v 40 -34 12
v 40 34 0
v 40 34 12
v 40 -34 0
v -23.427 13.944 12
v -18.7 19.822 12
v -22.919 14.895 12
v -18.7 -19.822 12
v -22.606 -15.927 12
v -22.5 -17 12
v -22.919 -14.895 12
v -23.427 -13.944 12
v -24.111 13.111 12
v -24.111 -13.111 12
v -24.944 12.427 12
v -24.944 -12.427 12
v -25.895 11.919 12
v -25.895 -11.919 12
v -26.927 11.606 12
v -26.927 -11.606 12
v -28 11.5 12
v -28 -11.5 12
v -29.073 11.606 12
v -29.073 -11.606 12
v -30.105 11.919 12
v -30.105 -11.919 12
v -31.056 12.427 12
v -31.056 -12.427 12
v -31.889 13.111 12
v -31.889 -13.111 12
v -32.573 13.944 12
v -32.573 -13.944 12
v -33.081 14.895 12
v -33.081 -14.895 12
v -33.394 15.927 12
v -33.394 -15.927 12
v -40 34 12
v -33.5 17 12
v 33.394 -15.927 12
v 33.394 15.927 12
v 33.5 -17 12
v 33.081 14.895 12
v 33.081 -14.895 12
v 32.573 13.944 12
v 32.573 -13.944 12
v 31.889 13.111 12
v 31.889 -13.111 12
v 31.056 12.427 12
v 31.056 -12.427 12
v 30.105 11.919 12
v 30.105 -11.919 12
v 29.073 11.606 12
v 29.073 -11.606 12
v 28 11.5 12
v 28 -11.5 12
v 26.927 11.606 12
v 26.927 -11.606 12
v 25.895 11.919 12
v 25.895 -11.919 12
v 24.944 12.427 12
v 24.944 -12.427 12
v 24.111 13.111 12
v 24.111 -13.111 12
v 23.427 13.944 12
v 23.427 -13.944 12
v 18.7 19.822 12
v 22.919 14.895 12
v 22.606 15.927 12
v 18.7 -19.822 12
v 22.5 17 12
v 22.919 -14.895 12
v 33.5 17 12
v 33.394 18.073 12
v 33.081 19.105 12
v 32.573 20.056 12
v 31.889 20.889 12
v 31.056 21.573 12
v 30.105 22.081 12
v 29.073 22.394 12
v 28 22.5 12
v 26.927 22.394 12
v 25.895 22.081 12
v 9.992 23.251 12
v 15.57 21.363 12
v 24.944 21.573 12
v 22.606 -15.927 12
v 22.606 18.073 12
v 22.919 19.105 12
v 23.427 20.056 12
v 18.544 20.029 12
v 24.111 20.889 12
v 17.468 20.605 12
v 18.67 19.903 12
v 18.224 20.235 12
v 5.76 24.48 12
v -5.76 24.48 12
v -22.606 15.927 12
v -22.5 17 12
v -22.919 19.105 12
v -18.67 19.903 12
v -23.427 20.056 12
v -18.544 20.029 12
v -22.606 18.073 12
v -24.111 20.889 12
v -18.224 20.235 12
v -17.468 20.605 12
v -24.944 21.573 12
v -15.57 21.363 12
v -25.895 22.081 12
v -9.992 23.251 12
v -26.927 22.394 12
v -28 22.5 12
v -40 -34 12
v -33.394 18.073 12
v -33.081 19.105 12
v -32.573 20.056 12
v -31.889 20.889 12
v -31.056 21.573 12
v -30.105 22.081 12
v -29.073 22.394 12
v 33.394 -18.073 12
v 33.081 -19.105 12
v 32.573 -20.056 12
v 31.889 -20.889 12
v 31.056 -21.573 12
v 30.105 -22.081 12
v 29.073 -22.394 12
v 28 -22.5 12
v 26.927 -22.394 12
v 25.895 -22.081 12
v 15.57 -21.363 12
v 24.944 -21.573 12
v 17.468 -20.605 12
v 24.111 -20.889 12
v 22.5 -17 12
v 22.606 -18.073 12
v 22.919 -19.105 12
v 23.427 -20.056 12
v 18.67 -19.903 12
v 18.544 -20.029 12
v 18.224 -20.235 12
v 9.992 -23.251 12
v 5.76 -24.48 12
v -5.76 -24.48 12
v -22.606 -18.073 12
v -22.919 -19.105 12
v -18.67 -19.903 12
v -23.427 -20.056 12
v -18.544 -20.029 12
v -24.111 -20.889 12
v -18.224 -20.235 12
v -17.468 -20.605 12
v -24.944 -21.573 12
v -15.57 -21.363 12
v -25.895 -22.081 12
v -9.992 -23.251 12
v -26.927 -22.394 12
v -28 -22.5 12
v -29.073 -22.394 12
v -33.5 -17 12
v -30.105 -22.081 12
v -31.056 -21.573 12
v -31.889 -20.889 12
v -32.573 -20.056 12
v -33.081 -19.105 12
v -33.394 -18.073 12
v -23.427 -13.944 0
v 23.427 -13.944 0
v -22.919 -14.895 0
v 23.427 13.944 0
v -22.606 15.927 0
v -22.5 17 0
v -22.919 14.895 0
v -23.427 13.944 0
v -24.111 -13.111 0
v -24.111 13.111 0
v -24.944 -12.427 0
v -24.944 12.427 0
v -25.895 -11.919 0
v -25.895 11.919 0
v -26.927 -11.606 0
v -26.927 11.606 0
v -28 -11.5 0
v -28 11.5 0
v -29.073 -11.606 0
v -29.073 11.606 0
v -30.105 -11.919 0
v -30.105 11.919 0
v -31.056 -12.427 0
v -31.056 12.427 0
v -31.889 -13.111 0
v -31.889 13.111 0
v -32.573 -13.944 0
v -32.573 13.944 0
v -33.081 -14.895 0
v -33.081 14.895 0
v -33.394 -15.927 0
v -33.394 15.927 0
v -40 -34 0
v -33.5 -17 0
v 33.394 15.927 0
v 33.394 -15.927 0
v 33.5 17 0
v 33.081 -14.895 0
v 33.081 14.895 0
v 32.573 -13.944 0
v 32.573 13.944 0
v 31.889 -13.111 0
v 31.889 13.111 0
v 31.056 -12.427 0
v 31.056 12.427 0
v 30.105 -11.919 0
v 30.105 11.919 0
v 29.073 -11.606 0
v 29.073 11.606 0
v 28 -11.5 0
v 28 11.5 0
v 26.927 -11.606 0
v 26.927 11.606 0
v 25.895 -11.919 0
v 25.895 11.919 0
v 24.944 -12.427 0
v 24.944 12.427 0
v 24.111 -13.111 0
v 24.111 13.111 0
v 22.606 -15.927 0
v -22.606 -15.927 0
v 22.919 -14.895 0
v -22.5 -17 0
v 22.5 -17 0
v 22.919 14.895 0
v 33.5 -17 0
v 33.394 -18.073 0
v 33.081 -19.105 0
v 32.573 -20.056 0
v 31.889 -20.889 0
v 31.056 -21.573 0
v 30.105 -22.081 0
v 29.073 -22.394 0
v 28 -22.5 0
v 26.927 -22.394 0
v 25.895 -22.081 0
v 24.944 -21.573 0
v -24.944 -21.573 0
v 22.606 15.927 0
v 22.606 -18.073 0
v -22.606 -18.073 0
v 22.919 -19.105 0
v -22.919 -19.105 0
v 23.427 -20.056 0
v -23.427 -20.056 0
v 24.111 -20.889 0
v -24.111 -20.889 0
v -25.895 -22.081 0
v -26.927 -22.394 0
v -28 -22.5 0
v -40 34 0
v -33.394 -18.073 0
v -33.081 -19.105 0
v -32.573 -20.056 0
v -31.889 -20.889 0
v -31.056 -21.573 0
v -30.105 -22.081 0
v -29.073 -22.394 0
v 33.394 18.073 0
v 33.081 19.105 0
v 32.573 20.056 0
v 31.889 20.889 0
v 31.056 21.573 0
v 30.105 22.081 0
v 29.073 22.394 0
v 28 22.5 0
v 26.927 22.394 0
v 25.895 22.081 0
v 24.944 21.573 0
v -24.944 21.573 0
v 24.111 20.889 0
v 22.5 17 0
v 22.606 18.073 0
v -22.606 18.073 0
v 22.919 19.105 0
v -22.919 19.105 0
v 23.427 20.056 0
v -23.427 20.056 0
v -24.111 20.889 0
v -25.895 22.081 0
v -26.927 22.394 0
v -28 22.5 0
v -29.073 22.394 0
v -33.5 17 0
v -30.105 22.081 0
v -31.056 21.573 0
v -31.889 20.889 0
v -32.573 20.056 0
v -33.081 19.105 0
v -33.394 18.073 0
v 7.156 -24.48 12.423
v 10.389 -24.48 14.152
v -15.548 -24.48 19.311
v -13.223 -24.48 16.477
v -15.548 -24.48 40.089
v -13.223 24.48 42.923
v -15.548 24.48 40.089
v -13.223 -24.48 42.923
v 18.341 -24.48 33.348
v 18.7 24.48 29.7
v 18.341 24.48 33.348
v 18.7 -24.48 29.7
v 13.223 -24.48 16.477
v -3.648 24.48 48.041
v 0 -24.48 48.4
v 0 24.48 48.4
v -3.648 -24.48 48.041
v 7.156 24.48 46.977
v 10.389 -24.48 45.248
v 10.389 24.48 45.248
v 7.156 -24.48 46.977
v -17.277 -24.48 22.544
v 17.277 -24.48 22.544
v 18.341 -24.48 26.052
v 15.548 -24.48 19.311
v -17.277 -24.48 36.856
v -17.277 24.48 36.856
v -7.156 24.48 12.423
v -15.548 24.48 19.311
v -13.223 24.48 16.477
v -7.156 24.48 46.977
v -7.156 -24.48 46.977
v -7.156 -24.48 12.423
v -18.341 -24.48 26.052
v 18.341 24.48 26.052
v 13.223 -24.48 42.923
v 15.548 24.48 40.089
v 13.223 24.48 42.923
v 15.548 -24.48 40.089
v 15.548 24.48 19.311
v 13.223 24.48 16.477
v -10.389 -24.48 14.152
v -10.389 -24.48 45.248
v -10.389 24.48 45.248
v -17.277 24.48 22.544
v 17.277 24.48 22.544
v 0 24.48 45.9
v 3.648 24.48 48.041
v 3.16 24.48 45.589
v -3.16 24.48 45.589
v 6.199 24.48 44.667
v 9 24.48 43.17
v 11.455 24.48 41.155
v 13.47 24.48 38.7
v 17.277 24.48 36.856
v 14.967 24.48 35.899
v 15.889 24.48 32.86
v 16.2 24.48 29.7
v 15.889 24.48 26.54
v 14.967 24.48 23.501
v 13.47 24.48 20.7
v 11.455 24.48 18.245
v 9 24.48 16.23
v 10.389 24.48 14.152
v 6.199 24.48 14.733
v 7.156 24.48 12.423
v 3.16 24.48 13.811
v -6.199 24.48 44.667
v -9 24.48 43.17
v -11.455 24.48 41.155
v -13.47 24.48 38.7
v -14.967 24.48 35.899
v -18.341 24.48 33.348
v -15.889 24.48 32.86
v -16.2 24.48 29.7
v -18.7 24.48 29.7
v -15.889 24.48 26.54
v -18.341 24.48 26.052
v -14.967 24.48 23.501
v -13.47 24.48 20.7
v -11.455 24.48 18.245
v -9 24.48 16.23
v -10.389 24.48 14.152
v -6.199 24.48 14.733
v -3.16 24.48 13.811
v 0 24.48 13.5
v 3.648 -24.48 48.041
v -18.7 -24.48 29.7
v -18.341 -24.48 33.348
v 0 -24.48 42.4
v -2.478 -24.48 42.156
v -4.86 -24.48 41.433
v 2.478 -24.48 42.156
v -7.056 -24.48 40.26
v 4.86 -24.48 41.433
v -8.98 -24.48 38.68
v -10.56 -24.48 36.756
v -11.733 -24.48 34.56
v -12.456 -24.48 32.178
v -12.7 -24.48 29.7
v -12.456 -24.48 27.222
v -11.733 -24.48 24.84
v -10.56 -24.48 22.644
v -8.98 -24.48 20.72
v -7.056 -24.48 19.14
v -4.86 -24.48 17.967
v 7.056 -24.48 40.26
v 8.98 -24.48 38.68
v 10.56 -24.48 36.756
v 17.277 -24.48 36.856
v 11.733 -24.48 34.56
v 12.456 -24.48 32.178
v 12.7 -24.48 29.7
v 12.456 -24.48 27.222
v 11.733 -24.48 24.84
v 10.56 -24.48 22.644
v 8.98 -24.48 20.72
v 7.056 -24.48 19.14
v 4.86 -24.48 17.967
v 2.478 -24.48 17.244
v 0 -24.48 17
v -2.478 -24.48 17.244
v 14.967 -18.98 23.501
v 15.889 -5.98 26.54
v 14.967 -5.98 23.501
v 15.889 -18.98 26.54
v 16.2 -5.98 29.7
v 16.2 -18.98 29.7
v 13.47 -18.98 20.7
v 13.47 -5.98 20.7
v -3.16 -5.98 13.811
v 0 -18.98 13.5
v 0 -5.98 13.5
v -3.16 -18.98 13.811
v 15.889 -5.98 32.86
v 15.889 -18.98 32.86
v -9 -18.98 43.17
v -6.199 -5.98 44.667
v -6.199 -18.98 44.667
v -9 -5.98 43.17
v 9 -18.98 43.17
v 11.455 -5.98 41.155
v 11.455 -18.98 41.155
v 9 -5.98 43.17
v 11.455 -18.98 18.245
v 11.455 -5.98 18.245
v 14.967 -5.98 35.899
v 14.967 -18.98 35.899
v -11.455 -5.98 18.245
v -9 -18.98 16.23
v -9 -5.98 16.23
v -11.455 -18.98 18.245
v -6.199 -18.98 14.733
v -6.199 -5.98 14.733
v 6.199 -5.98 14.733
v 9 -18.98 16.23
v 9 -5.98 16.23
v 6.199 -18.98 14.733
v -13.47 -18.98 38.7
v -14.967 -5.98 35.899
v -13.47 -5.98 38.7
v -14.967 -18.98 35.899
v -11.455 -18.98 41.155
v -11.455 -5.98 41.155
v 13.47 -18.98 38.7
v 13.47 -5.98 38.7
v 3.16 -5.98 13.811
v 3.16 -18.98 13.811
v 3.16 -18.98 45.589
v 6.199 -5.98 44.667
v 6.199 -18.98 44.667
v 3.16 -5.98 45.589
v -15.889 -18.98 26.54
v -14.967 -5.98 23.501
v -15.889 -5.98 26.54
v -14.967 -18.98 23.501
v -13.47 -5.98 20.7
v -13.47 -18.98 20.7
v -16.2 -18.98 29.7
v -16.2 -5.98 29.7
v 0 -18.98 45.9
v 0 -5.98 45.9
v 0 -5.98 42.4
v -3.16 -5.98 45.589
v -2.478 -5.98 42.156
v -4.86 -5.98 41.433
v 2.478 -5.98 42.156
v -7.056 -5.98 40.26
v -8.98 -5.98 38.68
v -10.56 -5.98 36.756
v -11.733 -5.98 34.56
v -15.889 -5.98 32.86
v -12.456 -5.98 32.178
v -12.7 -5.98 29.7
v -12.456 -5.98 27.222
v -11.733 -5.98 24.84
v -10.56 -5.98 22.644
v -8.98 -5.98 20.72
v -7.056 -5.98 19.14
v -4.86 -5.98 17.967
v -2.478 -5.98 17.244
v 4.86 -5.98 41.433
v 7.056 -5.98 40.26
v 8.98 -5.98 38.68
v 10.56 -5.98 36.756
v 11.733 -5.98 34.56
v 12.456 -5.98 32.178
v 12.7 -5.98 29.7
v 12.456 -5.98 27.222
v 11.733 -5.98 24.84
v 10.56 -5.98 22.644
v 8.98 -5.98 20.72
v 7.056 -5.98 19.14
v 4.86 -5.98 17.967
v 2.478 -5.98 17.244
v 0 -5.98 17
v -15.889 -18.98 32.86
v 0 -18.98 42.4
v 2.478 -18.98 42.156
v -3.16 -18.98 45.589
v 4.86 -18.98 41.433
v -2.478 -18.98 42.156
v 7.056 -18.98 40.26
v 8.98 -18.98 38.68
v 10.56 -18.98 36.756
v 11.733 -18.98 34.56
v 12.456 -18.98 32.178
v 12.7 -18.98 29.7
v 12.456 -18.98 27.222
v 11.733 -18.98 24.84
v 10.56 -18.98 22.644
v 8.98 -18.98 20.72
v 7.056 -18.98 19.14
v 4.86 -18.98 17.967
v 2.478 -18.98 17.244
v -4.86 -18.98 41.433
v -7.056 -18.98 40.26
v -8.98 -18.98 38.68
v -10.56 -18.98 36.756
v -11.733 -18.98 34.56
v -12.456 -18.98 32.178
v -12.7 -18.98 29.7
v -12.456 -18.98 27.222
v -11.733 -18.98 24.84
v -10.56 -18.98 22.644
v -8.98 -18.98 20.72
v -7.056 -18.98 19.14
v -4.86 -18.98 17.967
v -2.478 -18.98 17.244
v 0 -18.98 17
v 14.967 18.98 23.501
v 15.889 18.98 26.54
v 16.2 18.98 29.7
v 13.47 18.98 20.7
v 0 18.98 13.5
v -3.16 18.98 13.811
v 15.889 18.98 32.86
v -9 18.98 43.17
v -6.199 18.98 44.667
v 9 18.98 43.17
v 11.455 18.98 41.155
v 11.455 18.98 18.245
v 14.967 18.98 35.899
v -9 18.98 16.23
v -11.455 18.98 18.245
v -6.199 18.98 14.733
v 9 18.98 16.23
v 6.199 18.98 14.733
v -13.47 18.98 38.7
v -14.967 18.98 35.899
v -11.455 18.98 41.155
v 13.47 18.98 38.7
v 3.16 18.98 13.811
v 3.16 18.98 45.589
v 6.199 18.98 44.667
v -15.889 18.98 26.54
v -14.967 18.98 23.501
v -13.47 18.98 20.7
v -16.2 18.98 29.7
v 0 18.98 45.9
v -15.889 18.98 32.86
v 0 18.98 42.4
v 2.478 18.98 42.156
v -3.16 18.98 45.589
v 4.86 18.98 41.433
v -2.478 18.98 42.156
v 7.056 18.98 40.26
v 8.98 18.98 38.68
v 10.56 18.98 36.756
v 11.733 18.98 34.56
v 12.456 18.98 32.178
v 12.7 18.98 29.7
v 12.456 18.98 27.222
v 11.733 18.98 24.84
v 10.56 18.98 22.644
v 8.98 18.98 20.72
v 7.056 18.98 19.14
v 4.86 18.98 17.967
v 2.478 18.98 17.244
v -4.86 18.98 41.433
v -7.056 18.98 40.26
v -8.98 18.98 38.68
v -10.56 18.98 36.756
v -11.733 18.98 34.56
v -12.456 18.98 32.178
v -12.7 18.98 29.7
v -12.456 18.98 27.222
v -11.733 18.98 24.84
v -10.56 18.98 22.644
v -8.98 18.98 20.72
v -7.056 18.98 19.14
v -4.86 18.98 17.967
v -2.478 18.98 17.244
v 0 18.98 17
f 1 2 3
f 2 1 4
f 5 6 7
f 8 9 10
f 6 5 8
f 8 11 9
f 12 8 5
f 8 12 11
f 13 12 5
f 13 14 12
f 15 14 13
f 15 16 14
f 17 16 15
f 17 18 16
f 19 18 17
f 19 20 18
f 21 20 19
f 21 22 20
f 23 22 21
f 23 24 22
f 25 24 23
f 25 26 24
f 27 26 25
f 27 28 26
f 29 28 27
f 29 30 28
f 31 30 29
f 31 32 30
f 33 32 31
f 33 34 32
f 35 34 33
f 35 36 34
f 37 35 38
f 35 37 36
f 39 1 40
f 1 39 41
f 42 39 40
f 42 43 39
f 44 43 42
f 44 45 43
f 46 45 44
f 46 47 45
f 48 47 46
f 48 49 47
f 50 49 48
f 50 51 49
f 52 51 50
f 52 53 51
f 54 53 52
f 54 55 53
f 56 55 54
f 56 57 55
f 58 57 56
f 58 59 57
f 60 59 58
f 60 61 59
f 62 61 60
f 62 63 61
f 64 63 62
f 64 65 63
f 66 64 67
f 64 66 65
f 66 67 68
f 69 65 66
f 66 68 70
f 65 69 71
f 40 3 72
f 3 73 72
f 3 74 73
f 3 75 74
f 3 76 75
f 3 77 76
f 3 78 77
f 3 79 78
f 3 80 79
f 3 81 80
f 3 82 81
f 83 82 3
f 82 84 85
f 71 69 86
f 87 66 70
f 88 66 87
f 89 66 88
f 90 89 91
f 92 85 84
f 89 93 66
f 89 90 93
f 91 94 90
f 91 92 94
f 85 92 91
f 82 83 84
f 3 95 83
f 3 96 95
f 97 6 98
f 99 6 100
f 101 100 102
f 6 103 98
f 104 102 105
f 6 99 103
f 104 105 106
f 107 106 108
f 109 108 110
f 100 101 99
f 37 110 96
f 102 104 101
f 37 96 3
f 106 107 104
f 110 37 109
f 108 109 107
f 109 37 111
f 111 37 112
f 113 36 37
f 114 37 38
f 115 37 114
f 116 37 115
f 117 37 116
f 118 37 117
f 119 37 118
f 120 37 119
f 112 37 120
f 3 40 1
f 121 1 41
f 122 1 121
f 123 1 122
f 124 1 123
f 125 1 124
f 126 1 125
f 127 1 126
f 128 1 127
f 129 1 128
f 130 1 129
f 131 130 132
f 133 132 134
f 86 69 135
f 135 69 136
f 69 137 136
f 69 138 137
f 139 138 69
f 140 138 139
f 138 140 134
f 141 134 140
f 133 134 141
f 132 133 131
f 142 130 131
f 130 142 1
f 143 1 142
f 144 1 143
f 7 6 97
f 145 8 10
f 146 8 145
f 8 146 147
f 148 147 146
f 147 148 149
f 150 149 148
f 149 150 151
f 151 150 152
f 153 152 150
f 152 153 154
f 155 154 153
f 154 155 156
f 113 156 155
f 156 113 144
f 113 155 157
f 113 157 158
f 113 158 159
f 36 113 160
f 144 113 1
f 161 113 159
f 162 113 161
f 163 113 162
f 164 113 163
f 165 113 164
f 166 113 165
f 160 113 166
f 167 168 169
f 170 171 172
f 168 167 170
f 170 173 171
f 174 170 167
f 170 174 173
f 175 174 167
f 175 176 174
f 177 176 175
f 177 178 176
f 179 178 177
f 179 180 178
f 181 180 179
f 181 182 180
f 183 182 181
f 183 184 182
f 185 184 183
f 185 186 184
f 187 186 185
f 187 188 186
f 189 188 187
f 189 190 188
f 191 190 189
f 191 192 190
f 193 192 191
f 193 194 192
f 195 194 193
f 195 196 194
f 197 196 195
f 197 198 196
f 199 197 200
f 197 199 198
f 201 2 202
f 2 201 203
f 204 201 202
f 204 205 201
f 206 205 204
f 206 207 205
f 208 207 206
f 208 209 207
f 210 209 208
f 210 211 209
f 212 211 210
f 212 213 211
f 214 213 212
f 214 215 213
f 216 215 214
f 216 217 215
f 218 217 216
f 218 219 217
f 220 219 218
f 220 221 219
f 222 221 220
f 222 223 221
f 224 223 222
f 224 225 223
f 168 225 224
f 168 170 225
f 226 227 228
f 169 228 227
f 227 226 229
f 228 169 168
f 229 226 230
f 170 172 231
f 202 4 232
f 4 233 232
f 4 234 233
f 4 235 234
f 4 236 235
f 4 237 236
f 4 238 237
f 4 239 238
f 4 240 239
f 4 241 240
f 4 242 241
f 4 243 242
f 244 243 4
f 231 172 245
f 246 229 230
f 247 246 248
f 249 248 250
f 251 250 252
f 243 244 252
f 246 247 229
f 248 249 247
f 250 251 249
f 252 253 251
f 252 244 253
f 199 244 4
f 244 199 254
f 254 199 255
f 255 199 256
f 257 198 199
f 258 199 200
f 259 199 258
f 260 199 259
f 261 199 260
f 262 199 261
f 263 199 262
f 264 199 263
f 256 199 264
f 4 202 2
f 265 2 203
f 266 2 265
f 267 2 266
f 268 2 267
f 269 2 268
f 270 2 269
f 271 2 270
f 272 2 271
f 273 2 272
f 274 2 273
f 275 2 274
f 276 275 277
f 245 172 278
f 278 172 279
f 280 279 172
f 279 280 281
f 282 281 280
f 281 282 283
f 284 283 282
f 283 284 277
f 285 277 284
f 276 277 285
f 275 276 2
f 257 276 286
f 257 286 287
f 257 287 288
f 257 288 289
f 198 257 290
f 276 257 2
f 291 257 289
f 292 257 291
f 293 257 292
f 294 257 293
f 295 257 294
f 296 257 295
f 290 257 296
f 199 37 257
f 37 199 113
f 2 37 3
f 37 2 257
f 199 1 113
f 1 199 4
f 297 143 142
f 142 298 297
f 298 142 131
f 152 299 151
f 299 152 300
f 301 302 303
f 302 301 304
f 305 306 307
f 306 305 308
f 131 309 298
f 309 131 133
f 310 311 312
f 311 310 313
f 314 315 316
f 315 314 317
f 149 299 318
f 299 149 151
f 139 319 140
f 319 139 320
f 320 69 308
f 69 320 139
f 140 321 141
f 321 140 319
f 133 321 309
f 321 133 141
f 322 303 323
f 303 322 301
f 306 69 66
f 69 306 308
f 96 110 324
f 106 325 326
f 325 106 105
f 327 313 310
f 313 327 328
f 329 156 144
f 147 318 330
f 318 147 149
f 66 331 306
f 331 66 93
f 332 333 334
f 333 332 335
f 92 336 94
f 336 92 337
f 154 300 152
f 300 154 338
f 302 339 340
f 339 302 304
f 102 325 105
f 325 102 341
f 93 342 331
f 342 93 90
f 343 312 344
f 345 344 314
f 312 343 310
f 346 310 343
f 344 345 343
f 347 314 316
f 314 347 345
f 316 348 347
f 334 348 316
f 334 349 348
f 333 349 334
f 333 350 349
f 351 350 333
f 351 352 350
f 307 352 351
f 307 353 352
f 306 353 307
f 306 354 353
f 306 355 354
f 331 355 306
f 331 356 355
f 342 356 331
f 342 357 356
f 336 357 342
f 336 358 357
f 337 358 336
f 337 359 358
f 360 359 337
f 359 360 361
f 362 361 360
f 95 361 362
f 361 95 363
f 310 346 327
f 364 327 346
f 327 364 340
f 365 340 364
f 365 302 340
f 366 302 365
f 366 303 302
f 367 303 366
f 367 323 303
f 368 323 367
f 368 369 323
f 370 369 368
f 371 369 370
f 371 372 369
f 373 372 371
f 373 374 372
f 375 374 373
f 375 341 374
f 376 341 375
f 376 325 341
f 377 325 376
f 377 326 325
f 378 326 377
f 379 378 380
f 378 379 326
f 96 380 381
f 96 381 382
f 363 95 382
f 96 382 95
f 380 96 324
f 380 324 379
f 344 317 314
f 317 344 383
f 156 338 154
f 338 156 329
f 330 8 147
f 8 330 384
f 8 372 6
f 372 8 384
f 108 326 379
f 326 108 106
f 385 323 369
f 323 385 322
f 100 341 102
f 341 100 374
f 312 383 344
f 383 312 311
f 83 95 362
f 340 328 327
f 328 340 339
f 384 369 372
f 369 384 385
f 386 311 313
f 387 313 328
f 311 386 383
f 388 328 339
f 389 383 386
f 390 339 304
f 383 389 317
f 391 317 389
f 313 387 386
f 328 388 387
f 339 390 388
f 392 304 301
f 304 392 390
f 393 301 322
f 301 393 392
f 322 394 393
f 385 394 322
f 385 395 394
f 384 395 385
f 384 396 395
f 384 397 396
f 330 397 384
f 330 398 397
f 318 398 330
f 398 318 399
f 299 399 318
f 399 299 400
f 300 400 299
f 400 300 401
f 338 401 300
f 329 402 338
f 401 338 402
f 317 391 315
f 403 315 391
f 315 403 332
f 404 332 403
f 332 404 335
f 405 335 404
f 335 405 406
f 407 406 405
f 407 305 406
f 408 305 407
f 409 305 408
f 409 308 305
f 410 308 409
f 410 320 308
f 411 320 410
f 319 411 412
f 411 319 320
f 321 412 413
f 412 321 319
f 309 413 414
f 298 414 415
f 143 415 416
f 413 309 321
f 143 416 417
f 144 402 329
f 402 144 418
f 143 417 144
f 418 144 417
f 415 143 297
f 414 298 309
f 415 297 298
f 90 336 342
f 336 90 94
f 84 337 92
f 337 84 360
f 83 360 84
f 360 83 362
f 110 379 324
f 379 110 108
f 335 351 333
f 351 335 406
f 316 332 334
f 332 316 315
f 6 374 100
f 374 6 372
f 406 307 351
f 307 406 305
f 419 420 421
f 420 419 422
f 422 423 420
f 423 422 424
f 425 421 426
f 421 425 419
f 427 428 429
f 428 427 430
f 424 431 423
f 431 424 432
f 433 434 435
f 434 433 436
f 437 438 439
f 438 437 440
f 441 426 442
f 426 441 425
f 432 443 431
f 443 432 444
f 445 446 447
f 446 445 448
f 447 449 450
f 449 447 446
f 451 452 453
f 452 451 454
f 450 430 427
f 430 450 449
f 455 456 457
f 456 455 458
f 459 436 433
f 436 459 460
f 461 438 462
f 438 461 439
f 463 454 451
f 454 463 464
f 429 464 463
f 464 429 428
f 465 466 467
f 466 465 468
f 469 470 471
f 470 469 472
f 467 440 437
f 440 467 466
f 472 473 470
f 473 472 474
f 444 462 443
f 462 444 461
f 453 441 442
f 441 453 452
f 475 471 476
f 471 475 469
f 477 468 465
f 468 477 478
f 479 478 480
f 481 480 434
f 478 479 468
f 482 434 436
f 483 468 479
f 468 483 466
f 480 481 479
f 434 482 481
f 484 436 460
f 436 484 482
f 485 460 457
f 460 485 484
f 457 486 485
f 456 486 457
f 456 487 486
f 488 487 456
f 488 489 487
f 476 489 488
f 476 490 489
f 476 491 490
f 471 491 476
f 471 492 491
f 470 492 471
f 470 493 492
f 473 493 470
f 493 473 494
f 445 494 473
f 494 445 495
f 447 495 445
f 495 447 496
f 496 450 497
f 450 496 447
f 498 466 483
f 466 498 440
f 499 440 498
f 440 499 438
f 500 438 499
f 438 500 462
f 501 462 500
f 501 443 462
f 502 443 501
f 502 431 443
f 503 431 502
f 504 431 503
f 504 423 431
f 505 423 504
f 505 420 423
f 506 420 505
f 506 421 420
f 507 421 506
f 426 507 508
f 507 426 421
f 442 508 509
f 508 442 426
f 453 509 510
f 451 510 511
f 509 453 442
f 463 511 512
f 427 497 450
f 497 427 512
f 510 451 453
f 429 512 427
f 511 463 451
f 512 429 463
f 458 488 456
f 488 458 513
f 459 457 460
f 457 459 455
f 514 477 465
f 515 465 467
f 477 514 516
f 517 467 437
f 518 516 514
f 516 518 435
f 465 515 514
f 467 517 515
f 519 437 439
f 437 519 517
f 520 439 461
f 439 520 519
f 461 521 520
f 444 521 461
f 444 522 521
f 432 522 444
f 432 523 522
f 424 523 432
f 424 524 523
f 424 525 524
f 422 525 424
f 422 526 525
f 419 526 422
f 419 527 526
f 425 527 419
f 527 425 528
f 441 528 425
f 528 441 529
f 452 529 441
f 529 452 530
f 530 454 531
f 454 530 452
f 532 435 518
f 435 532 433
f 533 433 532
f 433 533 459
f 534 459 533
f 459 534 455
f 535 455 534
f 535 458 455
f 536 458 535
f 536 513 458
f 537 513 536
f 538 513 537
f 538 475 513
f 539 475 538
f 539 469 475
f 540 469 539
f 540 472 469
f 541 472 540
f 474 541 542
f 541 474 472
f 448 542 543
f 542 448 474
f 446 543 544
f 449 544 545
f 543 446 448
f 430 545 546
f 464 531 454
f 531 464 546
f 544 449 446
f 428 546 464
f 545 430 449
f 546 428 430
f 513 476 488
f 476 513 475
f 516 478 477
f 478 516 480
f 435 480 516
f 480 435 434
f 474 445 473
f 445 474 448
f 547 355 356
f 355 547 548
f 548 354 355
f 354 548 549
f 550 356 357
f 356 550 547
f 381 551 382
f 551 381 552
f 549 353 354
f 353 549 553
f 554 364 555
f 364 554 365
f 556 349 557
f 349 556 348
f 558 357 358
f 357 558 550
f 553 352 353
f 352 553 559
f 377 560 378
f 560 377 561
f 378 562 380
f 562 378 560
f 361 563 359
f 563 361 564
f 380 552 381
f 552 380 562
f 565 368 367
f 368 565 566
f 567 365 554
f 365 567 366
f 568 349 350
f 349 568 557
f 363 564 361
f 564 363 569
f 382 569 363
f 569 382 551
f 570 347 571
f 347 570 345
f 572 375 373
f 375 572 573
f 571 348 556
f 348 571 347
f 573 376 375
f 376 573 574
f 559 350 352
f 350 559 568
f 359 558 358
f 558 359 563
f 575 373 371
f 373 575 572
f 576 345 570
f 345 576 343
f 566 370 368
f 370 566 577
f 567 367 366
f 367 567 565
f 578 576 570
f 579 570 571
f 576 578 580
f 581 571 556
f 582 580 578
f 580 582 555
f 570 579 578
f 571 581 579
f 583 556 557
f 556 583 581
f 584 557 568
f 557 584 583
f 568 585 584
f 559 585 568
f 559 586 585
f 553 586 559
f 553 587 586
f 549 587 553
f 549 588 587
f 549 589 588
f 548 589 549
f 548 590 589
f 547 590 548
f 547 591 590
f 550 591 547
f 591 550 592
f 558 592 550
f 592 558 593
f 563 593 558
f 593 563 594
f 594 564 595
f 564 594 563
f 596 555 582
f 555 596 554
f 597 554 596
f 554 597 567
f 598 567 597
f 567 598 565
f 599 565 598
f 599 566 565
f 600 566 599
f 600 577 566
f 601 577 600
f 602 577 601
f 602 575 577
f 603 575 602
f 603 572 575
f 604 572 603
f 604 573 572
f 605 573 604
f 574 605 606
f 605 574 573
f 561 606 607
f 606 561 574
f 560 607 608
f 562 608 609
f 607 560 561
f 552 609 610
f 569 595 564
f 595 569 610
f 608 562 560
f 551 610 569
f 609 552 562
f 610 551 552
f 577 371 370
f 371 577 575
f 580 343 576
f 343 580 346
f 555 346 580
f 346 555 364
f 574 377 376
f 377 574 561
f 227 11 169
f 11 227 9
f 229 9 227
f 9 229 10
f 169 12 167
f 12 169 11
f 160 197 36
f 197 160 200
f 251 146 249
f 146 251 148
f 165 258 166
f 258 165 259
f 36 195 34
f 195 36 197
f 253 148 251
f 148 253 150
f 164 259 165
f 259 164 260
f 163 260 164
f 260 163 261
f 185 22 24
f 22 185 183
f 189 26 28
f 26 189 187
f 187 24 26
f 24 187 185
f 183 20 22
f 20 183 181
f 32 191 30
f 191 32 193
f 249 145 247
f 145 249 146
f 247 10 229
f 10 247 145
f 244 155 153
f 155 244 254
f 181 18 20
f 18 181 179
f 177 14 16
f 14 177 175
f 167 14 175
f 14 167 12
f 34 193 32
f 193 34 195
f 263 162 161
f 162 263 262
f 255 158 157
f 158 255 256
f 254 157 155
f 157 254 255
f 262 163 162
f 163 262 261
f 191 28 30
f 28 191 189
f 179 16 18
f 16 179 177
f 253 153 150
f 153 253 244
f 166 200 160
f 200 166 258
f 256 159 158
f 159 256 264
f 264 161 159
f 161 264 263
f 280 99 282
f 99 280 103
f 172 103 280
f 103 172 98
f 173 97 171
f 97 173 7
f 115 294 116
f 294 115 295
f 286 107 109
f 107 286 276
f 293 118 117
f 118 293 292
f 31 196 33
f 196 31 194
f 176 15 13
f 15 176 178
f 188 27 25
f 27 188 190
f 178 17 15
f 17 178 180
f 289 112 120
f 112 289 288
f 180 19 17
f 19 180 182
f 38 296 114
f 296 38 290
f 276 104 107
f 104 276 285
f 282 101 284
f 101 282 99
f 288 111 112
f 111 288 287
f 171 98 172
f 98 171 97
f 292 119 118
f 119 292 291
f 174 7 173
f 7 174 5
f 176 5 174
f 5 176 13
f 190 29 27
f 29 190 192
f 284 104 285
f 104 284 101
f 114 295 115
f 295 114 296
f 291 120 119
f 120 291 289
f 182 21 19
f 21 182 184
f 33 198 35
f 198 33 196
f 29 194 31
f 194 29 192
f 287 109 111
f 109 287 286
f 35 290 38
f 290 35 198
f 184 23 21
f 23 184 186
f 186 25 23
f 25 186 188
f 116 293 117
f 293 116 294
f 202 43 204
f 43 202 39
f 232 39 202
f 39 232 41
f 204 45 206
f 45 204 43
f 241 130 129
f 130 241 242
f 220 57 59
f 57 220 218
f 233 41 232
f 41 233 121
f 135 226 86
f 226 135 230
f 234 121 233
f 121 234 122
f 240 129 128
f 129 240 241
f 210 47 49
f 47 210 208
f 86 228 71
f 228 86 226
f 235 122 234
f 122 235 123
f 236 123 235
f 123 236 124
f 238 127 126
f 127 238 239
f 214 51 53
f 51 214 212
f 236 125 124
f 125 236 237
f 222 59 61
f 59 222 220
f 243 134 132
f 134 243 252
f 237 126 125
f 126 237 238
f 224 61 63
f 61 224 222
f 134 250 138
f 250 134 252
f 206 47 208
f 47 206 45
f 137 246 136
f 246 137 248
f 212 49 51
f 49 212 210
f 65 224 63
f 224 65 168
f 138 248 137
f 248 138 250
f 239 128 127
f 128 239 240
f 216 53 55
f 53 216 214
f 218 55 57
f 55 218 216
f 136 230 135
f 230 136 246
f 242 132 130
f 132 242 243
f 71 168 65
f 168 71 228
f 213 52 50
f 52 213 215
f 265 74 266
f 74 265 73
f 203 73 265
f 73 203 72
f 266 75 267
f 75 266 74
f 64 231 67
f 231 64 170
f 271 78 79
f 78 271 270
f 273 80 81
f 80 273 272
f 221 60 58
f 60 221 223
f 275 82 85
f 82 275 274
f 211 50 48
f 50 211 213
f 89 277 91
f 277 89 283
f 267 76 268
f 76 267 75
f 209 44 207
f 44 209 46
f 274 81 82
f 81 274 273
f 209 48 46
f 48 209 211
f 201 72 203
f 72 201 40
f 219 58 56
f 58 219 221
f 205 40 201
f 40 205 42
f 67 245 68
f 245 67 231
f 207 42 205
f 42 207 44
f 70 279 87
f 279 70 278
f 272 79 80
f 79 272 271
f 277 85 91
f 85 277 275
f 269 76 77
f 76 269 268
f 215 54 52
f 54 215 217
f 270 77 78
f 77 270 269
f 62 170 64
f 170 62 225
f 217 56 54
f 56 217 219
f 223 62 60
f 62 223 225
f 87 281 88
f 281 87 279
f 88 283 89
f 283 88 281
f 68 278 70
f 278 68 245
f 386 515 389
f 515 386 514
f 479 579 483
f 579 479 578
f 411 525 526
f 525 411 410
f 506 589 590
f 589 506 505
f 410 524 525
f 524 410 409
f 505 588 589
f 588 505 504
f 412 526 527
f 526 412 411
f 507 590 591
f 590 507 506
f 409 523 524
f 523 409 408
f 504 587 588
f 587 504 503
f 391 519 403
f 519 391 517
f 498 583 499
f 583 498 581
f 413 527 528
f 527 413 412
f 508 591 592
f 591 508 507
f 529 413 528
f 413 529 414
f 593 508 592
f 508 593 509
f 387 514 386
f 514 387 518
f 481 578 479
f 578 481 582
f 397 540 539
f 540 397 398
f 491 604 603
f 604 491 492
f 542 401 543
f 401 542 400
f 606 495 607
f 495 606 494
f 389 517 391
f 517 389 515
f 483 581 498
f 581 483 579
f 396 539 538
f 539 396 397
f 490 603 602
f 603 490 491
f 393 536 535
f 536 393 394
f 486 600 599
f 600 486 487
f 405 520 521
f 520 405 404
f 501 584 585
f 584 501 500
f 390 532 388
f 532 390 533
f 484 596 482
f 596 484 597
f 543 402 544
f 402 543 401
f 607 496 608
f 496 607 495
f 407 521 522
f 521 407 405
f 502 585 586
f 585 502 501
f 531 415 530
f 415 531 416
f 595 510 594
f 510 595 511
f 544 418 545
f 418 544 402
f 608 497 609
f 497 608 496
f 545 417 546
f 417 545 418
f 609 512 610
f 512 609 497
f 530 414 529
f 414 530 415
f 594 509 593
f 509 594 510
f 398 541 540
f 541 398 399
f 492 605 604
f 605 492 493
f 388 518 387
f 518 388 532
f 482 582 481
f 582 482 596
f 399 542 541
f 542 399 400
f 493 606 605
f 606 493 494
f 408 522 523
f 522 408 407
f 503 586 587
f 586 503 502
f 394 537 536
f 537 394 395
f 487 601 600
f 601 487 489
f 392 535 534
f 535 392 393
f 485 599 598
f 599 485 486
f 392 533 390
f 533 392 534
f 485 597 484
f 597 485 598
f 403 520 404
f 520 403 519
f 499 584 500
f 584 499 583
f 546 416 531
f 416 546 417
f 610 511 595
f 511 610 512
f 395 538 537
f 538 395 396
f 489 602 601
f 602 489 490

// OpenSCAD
$fn = 32;

// ----------------------------------------------------------------------
// Bearing block: 80 x 68 mm base, 25.4 mm bore at 29.7 mm
// ----------------------------------------------------------------------

// --- parameters (mm) ---
base_w = 80;              // base width
base_d = 68;              // base depth
base_t = 12;              // base thickness
bore_d = 25.4;            // shaft / bearing bore
house_r = 18.7;           // housing outer radius
house_len = 48.96;        // housing length along the shaft
foot_w = 37.4;            // foot width under the housing
foot_len = 38.96;         // foot length along the shaft
axis_z = 29.7;            // bore axis height above the base
holes_d = 11;             // mounting holes
hole_x = 28;              // mounting hole spacing
seat_d = 8;               // bearing seat depth
seat_wall = 3.5;          // seat wall thickness

difference() {
  union() {
    /* base plate with its underside on z = 0 */
    translate([0, 0, base_t / 2]) cube([base_w, base_d, base_t], center = true);
    /* hull foot: a straight web blending into the round housing */
    hull() {
      translate([0, 0, base_t - 0.5]) cube([foot_w, foot_len, 1.6], center = true);
      translate([0, 0, axis_z]) rotate([-90, 0, 0]) cylinder(h = house_len, d = 2 * house_r, center = true);
    }
  }
  /* bore through the housing, 2.5 mm clear on both sides */
  translate([0, 0, axis_z]) rotate([-90, 0, 0]) cylinder(h = house_len + 5, d = bore_d, center = true);
  /* bearing seats, recessed into both ends of the housing */
  for (sy = [-1, 1]) {
    translate([0, sy * (house_len / 2 - seat_d + 2.5), axis_z]) rotate([-90, 0, 0]) cylinder(h = seat_d + 5, d = bore_d + 2 * seat_wall);
  }
  /* mounting holes through the base plate */
  for (hx = [-28, 28]) {
    for (hy = [-17, 17]) {
      translate([hx, hy, -2.5]) cylinder(h = base_t + 5, d = holes_d);
    }
  }
}
